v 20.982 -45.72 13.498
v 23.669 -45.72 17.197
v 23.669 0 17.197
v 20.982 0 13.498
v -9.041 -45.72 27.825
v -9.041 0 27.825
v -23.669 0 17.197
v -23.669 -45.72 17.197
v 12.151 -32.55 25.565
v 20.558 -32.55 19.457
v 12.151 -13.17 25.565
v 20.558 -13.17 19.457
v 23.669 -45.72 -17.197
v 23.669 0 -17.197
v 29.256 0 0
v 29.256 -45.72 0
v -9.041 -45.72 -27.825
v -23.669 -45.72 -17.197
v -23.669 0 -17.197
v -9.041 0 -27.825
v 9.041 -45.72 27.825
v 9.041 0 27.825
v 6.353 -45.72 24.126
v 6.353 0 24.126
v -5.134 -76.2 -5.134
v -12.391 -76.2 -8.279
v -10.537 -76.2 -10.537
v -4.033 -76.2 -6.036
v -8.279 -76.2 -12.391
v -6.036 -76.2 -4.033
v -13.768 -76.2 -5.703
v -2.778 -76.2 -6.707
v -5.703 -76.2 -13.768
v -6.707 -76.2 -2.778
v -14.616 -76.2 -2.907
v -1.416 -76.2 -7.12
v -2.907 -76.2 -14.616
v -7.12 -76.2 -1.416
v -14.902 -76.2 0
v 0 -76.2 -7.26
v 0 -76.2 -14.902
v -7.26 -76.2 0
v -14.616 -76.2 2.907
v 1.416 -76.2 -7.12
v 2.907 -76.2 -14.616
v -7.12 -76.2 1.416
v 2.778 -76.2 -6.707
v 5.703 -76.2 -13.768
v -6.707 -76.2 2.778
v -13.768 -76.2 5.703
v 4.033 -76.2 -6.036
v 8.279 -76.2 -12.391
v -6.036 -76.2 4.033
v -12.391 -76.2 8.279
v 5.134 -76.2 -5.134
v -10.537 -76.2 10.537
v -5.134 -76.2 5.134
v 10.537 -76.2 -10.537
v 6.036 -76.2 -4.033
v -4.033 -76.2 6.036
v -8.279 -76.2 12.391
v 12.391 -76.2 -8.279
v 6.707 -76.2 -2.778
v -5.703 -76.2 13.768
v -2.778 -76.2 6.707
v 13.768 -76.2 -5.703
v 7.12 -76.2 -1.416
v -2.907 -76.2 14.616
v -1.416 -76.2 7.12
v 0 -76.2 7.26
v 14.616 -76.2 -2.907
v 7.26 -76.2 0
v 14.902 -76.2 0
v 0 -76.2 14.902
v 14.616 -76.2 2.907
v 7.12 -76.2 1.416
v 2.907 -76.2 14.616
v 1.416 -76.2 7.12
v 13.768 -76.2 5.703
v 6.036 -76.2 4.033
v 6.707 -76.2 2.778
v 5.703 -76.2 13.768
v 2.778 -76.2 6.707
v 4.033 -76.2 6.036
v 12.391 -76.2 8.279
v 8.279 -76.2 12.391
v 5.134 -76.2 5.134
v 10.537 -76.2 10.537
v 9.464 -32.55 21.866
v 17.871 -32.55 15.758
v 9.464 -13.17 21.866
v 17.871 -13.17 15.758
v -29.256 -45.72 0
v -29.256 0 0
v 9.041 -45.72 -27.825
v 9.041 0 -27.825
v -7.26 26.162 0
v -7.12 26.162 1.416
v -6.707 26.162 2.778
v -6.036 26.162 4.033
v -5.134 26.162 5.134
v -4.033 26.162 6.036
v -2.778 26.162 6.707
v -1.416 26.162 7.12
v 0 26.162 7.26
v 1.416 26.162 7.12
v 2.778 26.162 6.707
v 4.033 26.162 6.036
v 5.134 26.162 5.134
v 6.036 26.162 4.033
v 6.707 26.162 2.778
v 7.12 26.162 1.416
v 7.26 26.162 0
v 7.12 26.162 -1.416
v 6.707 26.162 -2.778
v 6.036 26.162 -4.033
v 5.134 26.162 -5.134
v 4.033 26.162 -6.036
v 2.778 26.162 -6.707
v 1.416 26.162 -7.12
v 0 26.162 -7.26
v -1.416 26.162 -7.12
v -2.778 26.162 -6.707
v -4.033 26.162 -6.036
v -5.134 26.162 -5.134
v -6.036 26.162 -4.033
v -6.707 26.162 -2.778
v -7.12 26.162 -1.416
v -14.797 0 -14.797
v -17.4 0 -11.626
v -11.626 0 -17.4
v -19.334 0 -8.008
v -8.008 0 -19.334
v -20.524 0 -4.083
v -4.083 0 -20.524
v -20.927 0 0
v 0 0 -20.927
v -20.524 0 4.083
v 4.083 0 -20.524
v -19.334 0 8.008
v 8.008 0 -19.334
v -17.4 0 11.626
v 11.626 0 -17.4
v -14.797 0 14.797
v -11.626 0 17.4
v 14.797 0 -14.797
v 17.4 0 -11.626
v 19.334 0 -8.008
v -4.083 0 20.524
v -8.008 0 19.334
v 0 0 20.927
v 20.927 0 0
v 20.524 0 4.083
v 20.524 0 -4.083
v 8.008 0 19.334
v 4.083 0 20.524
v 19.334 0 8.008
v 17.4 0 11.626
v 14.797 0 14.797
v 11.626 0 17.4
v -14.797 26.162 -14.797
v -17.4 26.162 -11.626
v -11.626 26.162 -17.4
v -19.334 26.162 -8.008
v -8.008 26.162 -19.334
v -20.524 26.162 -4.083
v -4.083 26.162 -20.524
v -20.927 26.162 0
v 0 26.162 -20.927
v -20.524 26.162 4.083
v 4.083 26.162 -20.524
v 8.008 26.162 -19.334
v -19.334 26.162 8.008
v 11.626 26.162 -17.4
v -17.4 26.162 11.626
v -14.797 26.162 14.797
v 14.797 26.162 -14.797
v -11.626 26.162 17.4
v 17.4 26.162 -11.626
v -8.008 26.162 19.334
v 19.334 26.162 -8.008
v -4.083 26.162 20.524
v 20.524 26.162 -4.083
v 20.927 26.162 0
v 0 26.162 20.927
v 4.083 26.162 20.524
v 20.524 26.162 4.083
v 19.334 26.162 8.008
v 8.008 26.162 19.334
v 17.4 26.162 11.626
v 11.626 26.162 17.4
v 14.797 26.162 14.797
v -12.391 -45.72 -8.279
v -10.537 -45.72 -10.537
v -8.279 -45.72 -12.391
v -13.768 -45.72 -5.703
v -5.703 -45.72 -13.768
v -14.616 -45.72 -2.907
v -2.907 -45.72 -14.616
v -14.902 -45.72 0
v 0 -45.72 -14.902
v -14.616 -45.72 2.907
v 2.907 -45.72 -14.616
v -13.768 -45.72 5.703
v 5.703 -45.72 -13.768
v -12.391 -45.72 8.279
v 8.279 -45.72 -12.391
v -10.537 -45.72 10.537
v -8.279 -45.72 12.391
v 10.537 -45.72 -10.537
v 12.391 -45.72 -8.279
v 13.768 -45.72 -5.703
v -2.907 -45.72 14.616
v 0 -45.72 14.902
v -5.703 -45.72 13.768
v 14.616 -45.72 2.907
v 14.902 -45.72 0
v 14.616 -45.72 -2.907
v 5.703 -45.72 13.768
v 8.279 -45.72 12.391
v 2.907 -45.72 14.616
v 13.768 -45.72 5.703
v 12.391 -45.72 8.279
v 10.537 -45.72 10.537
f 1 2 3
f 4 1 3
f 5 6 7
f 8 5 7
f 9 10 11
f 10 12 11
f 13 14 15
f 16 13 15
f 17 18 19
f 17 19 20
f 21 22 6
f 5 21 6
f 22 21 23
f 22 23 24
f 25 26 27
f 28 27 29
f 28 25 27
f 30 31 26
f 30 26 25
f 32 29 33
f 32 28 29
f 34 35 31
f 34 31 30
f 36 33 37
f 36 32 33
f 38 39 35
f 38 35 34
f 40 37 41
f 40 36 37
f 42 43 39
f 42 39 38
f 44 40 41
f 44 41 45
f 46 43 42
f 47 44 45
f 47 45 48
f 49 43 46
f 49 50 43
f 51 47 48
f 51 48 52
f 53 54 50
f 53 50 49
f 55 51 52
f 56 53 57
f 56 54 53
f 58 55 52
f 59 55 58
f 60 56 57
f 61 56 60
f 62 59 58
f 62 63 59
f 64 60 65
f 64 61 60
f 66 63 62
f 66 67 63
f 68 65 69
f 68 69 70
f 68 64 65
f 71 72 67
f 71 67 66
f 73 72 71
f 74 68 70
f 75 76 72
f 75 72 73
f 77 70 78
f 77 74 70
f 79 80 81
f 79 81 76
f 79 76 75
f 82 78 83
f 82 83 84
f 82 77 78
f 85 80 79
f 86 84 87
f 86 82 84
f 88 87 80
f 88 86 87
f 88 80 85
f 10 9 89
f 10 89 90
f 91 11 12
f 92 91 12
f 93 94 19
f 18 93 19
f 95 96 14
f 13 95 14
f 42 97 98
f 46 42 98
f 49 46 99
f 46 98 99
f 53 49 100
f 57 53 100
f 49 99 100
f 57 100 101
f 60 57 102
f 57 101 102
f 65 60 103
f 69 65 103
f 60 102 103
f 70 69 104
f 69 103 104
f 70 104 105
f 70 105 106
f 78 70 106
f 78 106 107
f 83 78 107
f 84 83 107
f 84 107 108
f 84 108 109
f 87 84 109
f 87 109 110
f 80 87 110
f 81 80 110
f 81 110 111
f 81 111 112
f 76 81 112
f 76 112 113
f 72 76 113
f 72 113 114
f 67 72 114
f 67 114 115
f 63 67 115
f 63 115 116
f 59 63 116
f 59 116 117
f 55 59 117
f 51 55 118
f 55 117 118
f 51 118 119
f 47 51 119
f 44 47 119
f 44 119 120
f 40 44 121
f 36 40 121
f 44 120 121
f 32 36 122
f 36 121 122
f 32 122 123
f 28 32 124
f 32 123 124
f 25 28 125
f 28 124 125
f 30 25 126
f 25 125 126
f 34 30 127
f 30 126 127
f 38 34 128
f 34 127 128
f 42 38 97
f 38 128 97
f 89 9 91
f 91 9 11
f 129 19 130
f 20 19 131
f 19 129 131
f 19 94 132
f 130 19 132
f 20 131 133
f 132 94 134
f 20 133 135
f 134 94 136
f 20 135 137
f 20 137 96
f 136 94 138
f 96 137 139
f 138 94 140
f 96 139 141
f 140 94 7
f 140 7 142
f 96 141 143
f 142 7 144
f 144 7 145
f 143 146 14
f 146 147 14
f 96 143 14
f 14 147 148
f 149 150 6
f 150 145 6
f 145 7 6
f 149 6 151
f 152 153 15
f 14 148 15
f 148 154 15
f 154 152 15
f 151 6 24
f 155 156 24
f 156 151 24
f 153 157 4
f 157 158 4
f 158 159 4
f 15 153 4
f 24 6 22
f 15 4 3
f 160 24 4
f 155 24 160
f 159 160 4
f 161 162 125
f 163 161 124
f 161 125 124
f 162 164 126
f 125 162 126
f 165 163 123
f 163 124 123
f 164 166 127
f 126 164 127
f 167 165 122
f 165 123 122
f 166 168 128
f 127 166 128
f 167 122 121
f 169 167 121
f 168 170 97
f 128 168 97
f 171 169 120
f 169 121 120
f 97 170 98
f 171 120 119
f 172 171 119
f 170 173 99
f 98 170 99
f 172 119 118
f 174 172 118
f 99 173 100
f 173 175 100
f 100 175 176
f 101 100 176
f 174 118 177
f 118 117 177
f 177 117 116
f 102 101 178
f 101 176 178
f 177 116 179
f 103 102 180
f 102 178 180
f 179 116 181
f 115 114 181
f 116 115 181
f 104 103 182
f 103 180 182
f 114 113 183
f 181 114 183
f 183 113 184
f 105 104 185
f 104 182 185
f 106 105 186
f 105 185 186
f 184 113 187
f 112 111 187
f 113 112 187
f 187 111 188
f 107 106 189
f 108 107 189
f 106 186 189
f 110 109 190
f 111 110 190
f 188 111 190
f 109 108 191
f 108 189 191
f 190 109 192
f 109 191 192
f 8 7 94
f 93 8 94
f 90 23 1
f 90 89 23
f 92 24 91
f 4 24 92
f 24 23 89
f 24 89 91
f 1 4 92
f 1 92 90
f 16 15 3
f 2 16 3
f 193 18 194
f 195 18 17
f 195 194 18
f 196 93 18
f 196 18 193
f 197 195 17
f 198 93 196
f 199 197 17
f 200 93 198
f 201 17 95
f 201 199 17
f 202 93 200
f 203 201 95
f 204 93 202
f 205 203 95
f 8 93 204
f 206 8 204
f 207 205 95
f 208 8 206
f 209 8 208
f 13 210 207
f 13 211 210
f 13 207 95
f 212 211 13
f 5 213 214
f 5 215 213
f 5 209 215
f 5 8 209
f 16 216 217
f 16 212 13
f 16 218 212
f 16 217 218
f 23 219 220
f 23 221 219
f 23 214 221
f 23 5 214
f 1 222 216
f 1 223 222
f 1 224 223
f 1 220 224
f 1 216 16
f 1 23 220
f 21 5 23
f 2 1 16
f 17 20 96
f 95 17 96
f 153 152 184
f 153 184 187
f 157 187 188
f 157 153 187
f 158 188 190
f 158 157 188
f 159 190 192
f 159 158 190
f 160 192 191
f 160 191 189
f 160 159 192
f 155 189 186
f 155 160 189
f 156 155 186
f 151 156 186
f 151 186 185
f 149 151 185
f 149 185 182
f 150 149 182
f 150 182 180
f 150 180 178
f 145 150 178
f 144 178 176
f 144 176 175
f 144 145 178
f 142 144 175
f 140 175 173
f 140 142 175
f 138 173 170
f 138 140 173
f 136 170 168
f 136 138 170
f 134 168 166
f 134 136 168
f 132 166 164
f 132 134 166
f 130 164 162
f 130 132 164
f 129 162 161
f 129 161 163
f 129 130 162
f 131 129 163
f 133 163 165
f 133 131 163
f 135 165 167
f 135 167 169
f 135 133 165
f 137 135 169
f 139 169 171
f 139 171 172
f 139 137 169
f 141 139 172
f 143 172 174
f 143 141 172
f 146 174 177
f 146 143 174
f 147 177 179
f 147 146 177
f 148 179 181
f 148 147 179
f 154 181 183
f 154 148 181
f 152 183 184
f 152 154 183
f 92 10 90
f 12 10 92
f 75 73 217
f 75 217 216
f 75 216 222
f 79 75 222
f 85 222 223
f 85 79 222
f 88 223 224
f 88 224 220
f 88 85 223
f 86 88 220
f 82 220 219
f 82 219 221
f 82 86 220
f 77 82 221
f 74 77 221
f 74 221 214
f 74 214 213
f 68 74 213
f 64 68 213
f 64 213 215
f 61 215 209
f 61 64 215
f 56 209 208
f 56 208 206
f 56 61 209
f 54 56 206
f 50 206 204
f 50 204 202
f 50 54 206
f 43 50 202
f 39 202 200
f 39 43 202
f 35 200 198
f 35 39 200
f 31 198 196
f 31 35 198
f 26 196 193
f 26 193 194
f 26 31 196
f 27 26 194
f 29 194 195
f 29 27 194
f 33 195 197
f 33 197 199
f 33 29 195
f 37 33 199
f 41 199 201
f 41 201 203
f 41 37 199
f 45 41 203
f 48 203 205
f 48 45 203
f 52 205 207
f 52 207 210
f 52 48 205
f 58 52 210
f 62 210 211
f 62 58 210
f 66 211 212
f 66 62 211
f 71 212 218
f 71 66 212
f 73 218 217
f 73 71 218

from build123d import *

# Parameters (mm, degrees)
F1_DEPTH = 76.2
F2_R     = 14.9020196794
F3_DEPTH = 30.48
F4_R     = 20.9265916745
F5_DEPTH = 26.162
F6_W     = 18.0814868103
F6_H     = 45.72
F6_W_2   = 10.3915287182
F6_H_2   = 19.3799102616
F7_DEPTH = 4.572
F8_R     = 7.2599789629
F9_DEPTH = 110.998


with BuildPart() as f1:
    # F0 (on Front) → F1 (new body)
    with BuildSketch(Plane.XZ):
        Polygon((9.0407434051, 27.8245471418), (-9.0407434051, 27.8245471418), (-23.6689735182, 17.1965158552), (-29.2564602261, 0), (-23.6689735182, -17.1965158552), (-9.0407434051, -27.8245471418), (9.0407434051, -27.8245471418), (23.6689735182, -17.1965158552), (29.2564602261, 0), (23.6689735182, 17.1965158552), align=None)
    extrude(amount=F1_DEPTH)

    # F2 (on face) → F3 (cut)
    with BuildSketch(Plane.XZ.offset(76.2)):
        Polygon((29.2564602261, 0), (23.6689735182, 17.1965158552), (9.0407434051, 27.8245471418), (-9.0407434051, 27.8245471418), (-23.6689735182, 17.1965158552), (-29.2564602261, 0), (-23.6689735182, -17.1965158552), (-9.0407434051, -27.8245471418), (9.0407434051, -27.8245471418), (23.6689735182, -17.1965158552), align=None)
        Circle(F2_R, mode=Mode.SUBTRACT)
    extrude(amount=-F3_DEPTH, mode=Mode.SUBTRACT)

    # F4 (on Front) → F5 (join)
    with BuildSketch(Plane.XZ):
        Circle(F4_R)
    extrude(amount=-F5_DEPTH)

    # F6 (on face) → F7 (cut)
    with BuildSketch(Plane(origin=(16.3548584617, 0, 22.5105314985), x_dir=(0.8090169944, 0, -0.5877852523), z_dir=(0.5877852523, 0, 0.8090169944))):
        with Locations((0, -22.86)):
            Rectangle(F6_W, F6_H)
        with Locations((0, -22.86)):
            Rectangle(F6_W_2, F6_H_2, mode=Mode.SUBTRACT)
    extrude(amount=-F7_DEPTH, mode=Mode.SUBTRACT)

    # F8 (on face) → F9 (cut)
    with BuildSketch(Plane(origin=(0, 26.162, 0), x_dir=(-1, 0, 0), z_dir=(0, 1, 0))):
        Circle(F8_R)
    extrude(amount=-F9_DEPTH, mode=Mode.SUBTRACT)


solid = f1.part
